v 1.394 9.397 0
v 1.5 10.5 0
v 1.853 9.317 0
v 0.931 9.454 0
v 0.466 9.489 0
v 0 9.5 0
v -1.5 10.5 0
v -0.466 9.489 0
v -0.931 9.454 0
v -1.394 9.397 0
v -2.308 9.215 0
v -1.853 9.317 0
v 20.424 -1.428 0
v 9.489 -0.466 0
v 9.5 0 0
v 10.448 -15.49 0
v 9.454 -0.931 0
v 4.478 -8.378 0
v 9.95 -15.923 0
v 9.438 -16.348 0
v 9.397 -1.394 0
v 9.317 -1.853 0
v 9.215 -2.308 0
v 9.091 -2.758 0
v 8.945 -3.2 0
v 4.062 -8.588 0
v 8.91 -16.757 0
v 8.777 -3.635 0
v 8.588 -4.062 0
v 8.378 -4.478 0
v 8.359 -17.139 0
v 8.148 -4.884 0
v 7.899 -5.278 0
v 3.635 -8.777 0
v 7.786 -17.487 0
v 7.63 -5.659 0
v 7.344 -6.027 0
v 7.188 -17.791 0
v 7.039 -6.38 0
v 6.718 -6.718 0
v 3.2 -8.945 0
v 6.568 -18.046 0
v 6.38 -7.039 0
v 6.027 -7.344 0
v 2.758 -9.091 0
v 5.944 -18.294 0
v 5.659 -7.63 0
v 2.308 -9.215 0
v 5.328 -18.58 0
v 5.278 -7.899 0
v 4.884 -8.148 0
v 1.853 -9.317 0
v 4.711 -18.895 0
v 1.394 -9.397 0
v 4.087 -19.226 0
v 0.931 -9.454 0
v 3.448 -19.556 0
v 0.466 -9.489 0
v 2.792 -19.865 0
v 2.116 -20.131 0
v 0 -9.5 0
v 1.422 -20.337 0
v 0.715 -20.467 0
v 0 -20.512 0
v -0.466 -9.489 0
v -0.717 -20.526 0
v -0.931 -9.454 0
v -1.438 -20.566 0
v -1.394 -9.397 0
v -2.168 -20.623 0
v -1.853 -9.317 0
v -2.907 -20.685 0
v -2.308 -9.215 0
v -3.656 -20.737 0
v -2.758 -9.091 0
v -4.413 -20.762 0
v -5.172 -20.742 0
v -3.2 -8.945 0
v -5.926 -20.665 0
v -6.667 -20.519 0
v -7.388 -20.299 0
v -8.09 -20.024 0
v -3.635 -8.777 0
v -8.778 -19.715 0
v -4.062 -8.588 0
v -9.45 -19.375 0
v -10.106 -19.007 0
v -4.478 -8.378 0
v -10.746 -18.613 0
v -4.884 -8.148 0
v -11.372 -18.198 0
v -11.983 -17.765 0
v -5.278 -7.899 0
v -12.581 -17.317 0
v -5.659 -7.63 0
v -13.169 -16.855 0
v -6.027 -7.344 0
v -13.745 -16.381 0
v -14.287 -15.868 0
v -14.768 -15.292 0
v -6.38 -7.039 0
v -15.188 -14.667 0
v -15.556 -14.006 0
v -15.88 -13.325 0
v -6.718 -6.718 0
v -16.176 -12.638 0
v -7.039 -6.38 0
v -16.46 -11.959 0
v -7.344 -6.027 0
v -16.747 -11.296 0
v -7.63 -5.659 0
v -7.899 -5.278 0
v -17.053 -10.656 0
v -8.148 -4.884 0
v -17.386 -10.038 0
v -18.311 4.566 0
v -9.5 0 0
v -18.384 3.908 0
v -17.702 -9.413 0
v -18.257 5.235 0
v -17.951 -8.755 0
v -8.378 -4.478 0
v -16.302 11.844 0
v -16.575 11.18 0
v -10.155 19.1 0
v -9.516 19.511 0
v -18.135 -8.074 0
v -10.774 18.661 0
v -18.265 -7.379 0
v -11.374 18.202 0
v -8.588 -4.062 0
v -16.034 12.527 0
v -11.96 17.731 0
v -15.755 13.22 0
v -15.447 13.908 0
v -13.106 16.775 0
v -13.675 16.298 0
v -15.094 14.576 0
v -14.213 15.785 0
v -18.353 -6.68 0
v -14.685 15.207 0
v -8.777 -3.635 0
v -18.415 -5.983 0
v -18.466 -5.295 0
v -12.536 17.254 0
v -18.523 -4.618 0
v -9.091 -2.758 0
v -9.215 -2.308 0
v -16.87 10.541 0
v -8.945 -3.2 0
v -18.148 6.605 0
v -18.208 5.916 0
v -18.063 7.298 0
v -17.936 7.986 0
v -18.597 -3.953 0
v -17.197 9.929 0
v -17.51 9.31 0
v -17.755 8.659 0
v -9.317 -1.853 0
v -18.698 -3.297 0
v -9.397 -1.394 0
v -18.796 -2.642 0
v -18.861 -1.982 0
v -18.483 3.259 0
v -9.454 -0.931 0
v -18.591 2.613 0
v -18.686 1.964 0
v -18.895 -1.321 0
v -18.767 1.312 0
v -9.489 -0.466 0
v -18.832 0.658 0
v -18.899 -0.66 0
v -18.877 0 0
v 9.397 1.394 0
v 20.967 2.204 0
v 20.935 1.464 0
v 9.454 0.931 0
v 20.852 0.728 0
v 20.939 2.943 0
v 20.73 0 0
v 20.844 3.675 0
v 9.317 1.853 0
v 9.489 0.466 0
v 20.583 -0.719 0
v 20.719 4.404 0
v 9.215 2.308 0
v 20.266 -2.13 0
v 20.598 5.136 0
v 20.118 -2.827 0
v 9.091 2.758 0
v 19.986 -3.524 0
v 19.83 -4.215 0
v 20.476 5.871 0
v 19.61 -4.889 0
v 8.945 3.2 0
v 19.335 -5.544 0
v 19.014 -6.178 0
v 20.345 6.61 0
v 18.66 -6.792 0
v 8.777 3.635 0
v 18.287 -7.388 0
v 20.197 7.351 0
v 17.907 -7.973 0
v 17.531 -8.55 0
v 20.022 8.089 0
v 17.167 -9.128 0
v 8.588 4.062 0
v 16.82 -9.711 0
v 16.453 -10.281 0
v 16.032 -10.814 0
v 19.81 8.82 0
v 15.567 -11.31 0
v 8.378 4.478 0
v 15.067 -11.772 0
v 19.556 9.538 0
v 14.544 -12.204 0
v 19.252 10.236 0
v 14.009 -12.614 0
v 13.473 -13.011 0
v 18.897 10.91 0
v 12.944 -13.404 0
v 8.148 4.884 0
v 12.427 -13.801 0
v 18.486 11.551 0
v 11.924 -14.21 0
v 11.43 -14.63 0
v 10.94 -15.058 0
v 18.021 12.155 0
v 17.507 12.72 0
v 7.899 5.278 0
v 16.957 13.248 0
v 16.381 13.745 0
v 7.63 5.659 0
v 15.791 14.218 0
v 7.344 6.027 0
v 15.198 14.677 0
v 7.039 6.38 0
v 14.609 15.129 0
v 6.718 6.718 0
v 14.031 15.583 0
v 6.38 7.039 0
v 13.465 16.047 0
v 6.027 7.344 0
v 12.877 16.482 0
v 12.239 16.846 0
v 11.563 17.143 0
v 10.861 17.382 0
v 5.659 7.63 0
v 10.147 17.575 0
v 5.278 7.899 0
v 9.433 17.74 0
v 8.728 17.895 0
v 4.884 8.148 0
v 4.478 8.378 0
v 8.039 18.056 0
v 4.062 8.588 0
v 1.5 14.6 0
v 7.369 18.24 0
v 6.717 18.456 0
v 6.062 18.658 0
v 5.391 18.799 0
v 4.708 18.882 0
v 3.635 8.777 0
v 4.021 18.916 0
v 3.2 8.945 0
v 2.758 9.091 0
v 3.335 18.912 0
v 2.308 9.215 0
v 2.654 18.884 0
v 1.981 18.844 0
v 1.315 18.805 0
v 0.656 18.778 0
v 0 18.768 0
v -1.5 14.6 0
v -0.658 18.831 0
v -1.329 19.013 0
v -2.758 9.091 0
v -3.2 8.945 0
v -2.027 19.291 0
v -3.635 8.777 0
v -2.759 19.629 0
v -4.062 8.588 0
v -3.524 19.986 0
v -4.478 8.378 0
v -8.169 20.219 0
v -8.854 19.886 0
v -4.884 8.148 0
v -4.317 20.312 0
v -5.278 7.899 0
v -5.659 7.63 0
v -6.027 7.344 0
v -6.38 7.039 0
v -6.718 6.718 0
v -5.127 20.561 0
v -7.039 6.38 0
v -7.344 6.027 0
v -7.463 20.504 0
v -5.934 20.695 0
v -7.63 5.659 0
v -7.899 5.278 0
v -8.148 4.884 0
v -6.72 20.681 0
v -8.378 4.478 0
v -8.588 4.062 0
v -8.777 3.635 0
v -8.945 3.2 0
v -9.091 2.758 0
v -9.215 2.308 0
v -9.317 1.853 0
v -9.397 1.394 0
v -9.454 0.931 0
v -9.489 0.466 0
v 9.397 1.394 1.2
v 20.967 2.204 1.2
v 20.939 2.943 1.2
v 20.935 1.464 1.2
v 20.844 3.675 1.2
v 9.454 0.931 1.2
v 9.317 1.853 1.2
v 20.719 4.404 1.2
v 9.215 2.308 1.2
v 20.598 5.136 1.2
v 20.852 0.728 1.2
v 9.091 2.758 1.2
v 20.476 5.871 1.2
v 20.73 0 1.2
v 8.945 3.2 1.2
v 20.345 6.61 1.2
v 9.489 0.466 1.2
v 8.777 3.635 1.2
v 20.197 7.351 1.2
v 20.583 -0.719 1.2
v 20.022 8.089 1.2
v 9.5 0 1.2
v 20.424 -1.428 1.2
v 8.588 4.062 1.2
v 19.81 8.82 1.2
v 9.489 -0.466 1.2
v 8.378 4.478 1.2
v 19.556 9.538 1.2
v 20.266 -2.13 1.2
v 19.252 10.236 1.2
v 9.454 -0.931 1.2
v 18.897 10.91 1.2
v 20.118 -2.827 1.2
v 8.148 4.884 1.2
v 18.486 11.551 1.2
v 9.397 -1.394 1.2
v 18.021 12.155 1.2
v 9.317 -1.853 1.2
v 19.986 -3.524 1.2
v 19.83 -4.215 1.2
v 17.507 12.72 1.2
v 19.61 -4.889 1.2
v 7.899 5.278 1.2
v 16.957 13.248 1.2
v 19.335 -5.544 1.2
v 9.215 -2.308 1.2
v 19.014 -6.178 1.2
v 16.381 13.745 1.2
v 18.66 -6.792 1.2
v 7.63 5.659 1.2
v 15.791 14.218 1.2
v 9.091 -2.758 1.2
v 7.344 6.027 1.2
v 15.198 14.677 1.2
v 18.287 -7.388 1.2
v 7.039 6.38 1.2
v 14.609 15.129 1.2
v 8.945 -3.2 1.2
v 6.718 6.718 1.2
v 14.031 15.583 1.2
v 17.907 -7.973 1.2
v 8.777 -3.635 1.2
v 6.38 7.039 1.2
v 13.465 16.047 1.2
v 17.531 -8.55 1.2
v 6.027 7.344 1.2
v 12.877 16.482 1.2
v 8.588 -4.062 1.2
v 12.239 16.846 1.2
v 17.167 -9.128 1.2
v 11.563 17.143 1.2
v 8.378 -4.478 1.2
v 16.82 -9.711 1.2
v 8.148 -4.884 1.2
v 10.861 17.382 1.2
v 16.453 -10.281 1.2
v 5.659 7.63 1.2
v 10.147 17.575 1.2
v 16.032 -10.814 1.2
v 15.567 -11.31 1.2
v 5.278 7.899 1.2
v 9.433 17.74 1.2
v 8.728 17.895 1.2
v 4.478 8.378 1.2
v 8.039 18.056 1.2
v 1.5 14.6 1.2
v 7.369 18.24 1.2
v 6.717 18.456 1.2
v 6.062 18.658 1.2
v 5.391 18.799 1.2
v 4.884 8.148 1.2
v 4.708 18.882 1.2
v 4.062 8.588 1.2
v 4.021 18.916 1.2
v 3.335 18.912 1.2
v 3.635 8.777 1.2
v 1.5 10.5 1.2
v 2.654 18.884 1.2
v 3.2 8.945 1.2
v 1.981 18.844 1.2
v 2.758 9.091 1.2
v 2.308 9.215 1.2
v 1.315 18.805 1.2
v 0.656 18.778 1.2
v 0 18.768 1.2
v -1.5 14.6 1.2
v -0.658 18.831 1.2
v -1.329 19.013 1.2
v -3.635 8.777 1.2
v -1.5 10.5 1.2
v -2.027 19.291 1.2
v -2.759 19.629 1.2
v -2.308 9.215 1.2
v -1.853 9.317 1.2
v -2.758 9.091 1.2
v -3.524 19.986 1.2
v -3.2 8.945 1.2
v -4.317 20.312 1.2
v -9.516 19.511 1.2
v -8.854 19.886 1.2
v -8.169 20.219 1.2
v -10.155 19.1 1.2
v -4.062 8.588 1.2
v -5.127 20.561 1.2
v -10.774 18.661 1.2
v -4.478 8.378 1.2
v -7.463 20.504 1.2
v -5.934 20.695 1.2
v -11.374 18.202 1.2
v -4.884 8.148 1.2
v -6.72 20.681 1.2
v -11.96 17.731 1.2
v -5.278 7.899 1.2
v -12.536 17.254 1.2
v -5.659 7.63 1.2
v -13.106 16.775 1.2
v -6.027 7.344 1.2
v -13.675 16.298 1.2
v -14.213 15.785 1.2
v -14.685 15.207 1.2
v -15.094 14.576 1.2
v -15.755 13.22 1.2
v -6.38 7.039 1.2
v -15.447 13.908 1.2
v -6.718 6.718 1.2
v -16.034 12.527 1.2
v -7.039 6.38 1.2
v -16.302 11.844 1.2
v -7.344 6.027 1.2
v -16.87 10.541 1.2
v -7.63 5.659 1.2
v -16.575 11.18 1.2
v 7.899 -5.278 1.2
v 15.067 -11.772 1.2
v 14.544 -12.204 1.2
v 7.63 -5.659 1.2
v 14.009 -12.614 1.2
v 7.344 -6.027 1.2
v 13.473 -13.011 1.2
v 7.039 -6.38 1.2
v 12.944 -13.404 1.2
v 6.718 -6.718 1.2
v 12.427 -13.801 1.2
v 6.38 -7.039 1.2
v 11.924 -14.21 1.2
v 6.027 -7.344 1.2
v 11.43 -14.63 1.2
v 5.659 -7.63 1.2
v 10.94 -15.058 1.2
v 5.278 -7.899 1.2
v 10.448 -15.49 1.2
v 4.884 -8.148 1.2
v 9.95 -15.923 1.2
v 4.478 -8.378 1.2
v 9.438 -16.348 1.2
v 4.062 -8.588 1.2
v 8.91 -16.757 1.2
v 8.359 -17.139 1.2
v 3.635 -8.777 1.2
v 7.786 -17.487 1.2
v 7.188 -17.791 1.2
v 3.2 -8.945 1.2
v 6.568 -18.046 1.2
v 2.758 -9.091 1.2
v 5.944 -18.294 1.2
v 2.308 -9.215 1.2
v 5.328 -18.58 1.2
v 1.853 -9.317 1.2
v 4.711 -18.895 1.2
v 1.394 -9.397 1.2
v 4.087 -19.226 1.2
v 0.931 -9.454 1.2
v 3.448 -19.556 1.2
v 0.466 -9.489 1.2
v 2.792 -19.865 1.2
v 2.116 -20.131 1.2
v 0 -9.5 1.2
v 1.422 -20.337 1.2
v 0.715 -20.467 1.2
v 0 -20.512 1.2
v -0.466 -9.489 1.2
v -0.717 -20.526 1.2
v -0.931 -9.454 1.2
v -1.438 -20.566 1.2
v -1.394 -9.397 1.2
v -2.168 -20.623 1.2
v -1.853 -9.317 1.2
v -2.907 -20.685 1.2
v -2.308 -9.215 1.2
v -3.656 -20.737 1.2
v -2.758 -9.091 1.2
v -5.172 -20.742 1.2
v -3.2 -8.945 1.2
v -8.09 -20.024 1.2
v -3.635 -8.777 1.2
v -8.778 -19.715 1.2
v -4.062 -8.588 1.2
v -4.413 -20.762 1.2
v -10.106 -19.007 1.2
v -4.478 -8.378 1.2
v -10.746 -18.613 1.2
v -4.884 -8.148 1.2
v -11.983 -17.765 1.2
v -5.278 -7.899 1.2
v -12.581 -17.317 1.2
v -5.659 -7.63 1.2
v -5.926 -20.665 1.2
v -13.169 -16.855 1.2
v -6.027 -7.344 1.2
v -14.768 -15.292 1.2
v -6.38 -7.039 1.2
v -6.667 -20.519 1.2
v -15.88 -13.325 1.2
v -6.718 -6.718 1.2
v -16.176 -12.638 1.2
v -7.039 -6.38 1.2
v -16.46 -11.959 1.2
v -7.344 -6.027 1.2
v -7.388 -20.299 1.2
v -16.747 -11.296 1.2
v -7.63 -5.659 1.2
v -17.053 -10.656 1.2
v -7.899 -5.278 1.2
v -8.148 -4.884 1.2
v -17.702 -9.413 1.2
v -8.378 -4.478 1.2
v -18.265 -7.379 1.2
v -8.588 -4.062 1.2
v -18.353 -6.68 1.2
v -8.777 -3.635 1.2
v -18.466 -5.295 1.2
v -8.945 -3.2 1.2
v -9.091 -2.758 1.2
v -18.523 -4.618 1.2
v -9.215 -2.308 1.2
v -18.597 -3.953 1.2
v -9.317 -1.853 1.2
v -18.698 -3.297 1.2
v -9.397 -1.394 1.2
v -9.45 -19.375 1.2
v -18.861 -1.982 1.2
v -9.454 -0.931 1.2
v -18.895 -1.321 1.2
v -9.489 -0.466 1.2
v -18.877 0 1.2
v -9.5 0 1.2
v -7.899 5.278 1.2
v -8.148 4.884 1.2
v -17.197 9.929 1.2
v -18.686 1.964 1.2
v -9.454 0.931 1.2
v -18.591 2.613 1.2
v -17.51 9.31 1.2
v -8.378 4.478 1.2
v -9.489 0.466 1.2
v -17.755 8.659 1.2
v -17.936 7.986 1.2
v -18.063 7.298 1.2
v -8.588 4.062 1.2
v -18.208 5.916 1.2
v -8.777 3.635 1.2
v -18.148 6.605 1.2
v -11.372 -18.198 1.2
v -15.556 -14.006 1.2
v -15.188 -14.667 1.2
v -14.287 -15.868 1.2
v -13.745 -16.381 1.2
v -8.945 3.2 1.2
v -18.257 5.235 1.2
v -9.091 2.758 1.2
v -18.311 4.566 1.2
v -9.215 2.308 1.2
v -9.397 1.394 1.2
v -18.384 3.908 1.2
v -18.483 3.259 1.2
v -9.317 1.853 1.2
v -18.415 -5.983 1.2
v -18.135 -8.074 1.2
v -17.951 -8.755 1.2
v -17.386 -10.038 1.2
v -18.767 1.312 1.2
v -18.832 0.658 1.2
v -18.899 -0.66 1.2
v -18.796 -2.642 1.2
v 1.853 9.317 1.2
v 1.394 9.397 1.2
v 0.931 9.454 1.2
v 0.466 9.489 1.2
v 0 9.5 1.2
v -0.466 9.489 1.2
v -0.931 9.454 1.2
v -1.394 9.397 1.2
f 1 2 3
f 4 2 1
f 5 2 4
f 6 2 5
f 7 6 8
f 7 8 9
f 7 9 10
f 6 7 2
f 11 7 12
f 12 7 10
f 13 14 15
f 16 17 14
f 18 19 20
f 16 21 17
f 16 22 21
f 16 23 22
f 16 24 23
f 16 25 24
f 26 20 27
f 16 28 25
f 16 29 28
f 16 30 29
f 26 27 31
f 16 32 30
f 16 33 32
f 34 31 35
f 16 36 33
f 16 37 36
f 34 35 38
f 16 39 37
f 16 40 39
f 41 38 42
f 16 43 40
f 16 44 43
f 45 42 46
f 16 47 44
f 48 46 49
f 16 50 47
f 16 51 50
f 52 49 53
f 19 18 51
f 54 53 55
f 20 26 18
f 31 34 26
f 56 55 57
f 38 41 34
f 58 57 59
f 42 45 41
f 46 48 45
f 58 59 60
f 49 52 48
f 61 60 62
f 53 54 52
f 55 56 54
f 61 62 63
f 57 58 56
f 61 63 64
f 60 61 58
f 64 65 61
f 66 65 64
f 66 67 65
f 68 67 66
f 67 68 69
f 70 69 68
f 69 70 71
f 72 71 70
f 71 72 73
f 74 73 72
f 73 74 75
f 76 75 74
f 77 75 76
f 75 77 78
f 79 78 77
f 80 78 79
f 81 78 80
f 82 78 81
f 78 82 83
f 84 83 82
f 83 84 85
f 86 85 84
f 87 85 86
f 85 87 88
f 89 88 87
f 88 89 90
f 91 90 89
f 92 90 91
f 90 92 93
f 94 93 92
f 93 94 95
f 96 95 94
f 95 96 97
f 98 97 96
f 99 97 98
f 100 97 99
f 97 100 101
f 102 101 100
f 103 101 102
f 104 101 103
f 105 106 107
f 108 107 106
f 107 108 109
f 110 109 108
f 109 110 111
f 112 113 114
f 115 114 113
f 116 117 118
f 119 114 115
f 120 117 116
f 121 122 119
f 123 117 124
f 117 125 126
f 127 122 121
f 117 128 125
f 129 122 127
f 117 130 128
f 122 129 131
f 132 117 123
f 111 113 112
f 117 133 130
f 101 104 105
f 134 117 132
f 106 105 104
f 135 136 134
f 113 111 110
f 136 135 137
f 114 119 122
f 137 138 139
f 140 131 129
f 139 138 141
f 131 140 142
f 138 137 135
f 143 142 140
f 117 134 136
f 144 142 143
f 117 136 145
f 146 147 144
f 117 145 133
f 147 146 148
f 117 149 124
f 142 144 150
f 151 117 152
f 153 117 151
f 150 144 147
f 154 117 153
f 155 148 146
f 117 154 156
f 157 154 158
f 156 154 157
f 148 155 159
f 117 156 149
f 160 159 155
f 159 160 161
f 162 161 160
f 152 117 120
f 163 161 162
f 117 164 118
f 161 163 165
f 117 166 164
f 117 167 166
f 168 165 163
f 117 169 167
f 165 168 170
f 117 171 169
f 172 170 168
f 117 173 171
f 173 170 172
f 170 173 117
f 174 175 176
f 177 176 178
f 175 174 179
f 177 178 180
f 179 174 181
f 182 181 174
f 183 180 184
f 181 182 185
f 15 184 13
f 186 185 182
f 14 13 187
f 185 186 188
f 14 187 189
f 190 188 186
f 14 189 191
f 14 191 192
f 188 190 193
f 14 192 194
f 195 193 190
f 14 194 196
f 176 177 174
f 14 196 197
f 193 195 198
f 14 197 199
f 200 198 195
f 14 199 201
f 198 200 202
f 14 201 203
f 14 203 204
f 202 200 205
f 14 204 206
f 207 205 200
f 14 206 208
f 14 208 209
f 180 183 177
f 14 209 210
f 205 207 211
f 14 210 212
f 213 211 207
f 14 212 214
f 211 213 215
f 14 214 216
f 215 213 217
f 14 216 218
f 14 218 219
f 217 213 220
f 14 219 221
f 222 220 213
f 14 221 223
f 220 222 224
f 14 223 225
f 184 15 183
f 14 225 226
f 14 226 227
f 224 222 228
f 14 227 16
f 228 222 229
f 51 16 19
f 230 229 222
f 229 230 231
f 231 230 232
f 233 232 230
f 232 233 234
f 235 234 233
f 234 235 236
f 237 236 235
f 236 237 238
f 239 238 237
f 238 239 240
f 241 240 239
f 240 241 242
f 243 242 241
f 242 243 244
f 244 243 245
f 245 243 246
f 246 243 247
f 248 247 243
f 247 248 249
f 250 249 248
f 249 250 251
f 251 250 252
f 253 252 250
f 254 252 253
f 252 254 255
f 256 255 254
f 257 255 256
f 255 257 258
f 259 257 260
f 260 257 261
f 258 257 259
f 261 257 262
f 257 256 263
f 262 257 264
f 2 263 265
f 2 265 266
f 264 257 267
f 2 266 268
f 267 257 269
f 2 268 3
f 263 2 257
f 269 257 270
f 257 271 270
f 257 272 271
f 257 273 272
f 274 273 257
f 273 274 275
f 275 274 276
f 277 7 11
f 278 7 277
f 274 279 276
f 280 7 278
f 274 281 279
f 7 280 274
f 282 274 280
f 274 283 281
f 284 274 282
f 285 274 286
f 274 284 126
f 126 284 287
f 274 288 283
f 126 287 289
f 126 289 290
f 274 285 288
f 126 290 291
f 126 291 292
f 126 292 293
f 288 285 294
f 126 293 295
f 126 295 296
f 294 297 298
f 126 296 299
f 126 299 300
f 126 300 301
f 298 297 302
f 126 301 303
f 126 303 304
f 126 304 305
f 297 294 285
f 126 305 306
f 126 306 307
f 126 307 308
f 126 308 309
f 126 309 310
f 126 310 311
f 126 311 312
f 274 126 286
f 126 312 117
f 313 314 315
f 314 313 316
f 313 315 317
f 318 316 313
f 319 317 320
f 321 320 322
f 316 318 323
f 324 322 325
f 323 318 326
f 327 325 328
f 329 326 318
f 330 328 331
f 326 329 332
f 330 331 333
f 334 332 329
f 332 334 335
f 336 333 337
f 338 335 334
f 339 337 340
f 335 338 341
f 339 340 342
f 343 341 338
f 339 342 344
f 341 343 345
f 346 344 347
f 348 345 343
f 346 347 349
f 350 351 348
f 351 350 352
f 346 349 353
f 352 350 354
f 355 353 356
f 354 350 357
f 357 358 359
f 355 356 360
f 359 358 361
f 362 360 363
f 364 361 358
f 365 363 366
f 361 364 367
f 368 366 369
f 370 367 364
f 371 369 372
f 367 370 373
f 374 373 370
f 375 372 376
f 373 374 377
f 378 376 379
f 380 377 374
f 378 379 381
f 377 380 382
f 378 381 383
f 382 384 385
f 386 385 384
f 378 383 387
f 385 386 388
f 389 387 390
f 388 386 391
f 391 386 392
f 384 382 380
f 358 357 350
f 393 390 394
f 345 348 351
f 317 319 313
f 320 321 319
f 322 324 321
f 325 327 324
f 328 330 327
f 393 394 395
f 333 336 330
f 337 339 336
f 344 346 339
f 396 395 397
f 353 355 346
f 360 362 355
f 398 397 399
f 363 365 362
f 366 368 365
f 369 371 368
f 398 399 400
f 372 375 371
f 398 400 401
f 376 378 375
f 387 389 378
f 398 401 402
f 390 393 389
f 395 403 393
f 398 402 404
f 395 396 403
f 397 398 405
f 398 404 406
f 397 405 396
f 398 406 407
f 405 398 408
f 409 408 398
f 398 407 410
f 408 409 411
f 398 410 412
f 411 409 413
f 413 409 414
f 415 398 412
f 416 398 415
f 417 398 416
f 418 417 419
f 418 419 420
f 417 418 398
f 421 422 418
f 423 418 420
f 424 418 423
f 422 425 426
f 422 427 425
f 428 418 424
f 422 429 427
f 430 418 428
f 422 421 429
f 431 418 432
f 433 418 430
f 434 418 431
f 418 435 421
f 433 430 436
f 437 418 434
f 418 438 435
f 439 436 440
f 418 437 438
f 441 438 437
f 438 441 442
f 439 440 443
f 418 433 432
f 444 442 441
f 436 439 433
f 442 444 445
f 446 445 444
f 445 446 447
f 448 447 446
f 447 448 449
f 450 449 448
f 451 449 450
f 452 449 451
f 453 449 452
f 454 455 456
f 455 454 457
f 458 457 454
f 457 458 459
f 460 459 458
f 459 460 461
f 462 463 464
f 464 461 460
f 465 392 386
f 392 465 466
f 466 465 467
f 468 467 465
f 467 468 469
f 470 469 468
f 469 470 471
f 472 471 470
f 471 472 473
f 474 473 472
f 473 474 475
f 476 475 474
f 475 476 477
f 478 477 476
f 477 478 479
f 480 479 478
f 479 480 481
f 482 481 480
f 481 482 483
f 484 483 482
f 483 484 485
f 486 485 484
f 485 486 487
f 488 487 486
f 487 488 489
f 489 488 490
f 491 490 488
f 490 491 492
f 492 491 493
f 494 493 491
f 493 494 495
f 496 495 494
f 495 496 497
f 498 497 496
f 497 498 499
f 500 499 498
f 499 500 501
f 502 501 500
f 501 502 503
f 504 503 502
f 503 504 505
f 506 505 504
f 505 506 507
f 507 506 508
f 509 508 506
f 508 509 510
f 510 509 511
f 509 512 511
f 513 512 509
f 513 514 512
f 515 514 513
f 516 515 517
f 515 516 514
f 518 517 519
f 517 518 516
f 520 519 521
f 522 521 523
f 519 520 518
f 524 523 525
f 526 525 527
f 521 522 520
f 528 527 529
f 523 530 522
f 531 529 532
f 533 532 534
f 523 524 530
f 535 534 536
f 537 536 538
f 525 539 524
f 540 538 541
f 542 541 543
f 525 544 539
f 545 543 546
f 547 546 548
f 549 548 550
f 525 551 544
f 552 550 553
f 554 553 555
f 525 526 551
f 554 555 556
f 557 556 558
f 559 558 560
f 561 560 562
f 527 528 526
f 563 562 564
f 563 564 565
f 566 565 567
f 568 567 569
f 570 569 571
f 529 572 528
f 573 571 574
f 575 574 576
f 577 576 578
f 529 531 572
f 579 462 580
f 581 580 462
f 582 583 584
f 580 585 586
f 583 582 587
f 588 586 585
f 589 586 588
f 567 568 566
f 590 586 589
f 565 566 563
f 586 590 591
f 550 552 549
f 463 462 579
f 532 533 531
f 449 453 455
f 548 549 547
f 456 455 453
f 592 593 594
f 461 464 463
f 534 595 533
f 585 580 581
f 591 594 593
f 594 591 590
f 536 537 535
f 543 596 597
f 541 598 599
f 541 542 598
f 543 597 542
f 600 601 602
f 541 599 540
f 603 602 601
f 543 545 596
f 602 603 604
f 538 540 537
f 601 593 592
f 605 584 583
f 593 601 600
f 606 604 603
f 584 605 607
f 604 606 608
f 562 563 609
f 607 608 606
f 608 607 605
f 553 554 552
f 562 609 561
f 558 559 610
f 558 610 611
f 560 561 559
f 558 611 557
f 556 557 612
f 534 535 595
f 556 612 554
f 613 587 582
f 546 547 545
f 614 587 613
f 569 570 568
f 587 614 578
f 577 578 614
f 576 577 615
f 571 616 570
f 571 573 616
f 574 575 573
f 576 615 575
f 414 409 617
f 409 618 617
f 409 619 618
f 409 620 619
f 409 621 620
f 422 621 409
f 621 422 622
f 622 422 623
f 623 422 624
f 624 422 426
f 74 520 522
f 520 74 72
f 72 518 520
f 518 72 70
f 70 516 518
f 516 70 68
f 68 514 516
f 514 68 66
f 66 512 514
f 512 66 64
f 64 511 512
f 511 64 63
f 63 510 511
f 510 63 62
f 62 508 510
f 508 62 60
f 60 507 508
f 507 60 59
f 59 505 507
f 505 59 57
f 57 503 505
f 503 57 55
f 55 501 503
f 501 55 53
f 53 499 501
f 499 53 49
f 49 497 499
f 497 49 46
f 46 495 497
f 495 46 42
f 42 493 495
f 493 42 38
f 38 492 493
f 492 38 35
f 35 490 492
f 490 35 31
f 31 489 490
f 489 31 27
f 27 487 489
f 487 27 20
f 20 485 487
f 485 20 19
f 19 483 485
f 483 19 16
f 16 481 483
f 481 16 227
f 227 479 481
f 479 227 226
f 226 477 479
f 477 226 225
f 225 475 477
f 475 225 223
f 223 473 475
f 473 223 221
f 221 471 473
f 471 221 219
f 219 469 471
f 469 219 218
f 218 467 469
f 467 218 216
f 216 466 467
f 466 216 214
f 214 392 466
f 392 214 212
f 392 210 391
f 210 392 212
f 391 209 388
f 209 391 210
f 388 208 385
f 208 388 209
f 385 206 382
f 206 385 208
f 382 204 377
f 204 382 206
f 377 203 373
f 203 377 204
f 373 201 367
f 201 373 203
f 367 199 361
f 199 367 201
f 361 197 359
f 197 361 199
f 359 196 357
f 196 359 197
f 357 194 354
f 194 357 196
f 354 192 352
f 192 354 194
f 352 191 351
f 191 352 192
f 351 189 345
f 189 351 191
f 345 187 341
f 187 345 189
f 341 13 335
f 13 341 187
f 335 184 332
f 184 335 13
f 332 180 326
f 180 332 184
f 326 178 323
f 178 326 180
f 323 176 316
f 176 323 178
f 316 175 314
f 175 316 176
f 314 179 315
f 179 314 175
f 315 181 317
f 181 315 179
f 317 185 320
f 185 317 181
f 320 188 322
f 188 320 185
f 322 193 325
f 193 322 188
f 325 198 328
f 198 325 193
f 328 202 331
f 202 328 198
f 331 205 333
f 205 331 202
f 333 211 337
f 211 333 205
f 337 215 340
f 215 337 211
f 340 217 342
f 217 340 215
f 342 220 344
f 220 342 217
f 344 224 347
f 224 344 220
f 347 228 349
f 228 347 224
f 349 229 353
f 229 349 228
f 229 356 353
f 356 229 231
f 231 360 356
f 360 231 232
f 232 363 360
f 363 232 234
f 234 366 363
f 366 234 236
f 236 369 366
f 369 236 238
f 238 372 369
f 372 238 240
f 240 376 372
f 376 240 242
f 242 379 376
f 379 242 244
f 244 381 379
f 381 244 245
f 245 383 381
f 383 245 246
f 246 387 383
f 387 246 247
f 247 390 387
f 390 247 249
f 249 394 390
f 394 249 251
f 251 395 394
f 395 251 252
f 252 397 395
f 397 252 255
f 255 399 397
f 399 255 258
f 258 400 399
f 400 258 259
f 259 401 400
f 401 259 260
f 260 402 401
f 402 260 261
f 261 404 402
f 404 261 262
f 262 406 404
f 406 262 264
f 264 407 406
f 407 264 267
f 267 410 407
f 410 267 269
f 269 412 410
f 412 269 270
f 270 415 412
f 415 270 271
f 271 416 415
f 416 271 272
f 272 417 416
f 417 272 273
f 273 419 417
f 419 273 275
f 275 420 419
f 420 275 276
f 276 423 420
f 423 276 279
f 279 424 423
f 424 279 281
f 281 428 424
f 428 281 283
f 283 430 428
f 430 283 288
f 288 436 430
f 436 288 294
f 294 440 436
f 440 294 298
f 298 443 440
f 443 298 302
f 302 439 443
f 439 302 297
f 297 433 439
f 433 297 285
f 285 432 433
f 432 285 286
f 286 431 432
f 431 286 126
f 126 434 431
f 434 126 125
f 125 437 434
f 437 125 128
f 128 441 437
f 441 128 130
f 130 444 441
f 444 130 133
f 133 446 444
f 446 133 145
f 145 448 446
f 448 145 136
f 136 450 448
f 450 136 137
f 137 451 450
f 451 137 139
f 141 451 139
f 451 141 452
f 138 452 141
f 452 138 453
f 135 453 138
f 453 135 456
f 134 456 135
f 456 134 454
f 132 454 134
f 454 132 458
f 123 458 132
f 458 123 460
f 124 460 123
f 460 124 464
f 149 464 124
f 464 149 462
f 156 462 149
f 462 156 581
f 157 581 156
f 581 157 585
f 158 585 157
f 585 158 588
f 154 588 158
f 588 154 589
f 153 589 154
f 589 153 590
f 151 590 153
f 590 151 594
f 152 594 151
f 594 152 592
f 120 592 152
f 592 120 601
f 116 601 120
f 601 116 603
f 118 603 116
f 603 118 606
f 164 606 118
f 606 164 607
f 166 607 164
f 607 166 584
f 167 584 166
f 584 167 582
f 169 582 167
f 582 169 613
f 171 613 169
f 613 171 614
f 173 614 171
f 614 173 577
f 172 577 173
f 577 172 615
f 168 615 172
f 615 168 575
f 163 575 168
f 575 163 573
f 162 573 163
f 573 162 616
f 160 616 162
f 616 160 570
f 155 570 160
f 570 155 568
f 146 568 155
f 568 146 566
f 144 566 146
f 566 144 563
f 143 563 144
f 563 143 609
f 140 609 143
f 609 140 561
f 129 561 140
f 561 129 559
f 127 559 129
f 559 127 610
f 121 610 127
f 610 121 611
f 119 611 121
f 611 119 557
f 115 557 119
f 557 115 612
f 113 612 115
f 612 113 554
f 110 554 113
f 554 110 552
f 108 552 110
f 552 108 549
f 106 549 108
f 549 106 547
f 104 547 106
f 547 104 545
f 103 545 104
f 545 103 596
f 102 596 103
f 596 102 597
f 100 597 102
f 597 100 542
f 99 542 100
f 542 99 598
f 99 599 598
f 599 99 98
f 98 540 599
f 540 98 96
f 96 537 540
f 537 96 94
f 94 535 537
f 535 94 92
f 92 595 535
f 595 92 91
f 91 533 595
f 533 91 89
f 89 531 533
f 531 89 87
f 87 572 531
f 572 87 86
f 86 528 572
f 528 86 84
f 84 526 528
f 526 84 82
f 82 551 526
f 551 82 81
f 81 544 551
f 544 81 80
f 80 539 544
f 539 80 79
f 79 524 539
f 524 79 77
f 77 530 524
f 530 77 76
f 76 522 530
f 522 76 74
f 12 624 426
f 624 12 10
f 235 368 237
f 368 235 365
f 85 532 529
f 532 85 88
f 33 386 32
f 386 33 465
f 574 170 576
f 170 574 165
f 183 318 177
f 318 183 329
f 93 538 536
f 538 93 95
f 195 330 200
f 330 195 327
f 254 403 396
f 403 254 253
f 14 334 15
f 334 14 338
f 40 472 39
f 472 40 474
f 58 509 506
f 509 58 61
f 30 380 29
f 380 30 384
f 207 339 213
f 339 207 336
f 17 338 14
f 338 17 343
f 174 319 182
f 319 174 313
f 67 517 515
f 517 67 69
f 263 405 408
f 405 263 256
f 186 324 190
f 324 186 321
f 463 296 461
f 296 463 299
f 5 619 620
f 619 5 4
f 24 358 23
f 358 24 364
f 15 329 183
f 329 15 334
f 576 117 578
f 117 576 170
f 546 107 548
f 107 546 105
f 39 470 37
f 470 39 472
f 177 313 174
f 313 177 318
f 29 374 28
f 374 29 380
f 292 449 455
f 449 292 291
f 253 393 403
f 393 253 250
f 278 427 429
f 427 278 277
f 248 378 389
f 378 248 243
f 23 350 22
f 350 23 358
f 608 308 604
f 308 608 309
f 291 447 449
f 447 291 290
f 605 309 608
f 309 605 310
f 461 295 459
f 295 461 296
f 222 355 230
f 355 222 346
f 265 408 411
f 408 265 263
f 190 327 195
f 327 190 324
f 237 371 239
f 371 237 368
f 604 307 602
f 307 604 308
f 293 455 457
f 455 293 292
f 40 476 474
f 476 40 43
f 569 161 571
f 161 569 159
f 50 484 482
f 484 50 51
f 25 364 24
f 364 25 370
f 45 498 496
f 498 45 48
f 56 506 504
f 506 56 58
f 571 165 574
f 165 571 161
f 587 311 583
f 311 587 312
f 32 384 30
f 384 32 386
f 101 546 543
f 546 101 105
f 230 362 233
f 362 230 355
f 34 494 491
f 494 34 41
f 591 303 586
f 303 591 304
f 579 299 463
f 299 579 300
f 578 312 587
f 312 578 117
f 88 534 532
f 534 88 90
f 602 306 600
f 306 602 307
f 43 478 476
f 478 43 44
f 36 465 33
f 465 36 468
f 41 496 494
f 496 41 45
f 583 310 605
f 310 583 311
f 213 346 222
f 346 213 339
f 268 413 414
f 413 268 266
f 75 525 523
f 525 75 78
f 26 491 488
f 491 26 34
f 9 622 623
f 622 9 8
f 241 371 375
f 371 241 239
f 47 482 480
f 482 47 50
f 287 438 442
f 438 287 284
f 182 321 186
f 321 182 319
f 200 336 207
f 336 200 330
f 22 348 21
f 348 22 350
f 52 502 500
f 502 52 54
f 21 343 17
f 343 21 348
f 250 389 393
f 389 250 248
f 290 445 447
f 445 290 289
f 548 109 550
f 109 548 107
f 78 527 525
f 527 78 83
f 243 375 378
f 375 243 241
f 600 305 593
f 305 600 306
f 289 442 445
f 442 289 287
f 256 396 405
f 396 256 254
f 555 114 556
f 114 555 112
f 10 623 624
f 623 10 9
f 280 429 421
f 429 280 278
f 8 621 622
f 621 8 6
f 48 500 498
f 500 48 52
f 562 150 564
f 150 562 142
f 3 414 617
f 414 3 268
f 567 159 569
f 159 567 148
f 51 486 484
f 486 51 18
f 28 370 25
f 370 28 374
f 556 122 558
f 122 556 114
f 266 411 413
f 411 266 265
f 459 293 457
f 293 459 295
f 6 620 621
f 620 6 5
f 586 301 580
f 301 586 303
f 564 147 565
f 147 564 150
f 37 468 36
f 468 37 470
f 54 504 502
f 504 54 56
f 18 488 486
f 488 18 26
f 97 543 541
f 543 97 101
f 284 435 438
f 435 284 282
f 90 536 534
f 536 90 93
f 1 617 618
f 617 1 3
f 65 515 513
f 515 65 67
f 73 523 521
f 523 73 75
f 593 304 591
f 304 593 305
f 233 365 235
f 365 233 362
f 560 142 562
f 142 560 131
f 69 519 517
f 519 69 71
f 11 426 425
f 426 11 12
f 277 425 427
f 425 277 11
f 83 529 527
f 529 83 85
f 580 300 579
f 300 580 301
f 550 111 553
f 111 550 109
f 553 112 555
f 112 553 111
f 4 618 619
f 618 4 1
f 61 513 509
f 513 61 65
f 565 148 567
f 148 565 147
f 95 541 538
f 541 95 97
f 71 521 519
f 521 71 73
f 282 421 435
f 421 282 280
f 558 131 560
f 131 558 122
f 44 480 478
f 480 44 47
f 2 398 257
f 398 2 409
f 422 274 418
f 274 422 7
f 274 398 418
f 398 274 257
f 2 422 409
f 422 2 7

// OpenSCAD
/*
  Elna Supermatic cam 26
  Name: Wave variant
  Status: candidate

  Generated from measured parametric base v2.
  Surface mode: smooth
*/

include <_elna_measured_common.scad>;

profile_points = [
        [0.0000, 18.7680],
        [0.6557, 18.7779],
        [1.3150, 18.8053],
        [1.9806, 18.8439],
        [2.6539, 18.8837],
        [3.3347, 18.9122],
        [4.0207, 18.9161],
        [4.7079, 18.8822],
        [5.3906, 18.7991],
        [6.0625, 18.6585],
        [6.7173, 18.4556],
        [7.3693, 18.2396],
        [8.0391, 18.0561],
        [8.7278, 17.8946],
        [9.4326, 17.7401],
        [10.1470, 17.5751],
        [10.8613, 17.3817],
        [11.5632, 17.1432],
        [12.2395, 16.8462],
        [12.8772, 16.4820],
        [13.4651, 16.0471],
        [14.0312, 15.5833],
        [14.6095, 15.1286],
        [15.1980, 14.6766],
        [15.7913, 14.2185],
        [16.3811, 13.7454],
        [16.9570, 13.2483],
        [17.5073, 12.7198],
        [18.0206, 12.1550],
        [18.4863, 11.5515],
        [18.8967, 10.9100],
        [19.2518, 10.2364],
        [19.5556, 9.5379],
        [19.8104, 8.8202],
        [20.0217, 8.0893],
        [20.1968, 7.3510],
        [20.3450, 6.6105],
        [20.4756, 5.8713],
        [20.5979, 5.1356],
        [20.7191, 4.4040],
        [20.8444, 3.6754],
        [20.9389, 2.9428],
        [20.9672, 2.2037],
        [20.9352, 1.4639],
        [20.8520, 0.7282],
        [20.7300, 0.0000],
        [20.5827, -0.7188],
        [20.4239, -1.4282],
        [20.2656, -2.1300],
        [20.1176, -2.8273],
        [19.9857, -3.5240],
        [19.8297, -4.2149],
        [19.6104, -4.8894],
        [19.3351, -5.5442],
        [19.0142, -6.1781],
        [18.6604, -6.7918],
        [18.2871, -7.3885],
        [17.9071, -7.9727],
        [17.5312, -8.5505],
        [17.1674, -9.1281],
        [16.8199, -9.7110],
        [16.4527, -10.2808],
        [16.0325, -10.8141],
        [15.5673, -11.3103],
        [15.0673, -11.7719],
        [14.5441, -12.2040],
        [14.0092, -12.6140],
        [13.4730, -13.0108],
        [12.9438, -13.4037],
        [12.4267, -13.8012],
        [11.9237, -14.2101],
        [11.4304, -14.6302],
        [10.9401, -15.0578],
        [10.4484, -15.4904],
        [9.9497, -15.9229],
        [9.4385, -16.3480],
        [8.9097, -16.7566],
        [8.3594, -17.1393],
        [7.7856, -17.4867],
        [7.1879, -17.7908],
        [6.5682, -18.0459],
        [5.9443, -18.2945],
        [5.3278, -18.5801],
        [4.7111, -18.8951],
        [4.0867, -19.2264],
        [3.4483, -19.5563],
        [2.7918, -19.8649],
        [2.1159, -20.1315],
        [1.4221, -20.3374],
        [0.7147, -20.4675],
        [0.0000, -20.5120],
        [-0.7168, -20.5262],
        [-1.4381, -20.5659],
        [-2.1676, -20.6231],
        [-2.9071, -20.6853],
        [-3.6565, -20.7371],
        [-4.4130, -20.7616],
        [-5.1716, -20.7423],
        [-5.9256, -20.6651],
        [-6.6671, -20.5194],
        [-7.3883, -20.2992],
        [-8.0903, -20.0241],
        [-8.7779, -19.7154],
        [-9.4500, -19.3754],
        [-10.1062, -19.0069],
        [-10.7465, -18.6135],
        [-11.3717, -18.1985],
        [-11.9829, -17.7654],
        [-12.5814, -17.3169],
        [-13.1686, -16.8550],
        [-13.7454, -16.3811],
        [-14.2873, -15.8676],
        [-14.7678, -15.2925],
        [-15.1884, -14.6673],
        [-15.5556, -14.0063],
        [-15.8801, -13.3250],
        [-16.1762, -12.6382],
        [-16.4599, -11.9588],
        [-16.7473, -11.2962],
        [-17.0526, -10.6556],
        [-17.3863, -10.0380],
        [-17.7025, -9.4126],
        [-17.9506, -8.7551],
        [-18.1351, -8.0743],
        [-18.2650, -7.3795],
        [-18.3531, -6.6800],
        [-18.4149, -5.9834],
        [-18.4665, -5.2952],
        [-18.5230, -4.6183],
        [-18.5972, -3.9530],
        [-18.6976, -3.2969],
        [-18.7959, -2.6416],
        [-18.8613, -1.9824],
        [-18.8949, -1.3213],
        [-18.8992, -0.6600],
        [-18.8770, -0.0000],
        [-18.8318, 0.6576],
        [-18.7671, 1.3123],
        [-18.6859, 1.9640],
        [-18.5906, 2.6127],
        [-18.4829, 3.2590],
        [-18.3840, 3.9076],
        [-18.3115, 4.5656],
        [-18.2569, 5.2351],
        [-18.2076, 5.9160],
        [-18.1483, 6.6054],
        [-18.0629, 7.2979],
        [-17.9360, 7.9856],
        [-17.7547, 8.6595],
        [-17.5100, 9.3102],
        [-17.1975, 9.9290],
        [-16.8699, 10.5415],
        [-16.5752, 11.1801],
        [-16.3017, 11.8439],
        [-16.0341, 12.5272],
        [-15.7549, 13.2199],
        [-15.4466, 13.9082],
        [-15.0939, 14.5760],
        [-14.6849, 15.2066],
        [-14.2126, 15.7846],
        [-13.6753, 16.2976],
        [-13.1064, 16.7754],
        [-12.5357, 17.2539],
        [-11.9596, 17.7309],
        [-11.3738, 18.2019],
        [-10.7738, 18.6607],
        [-10.1555, 19.0997],
        [-9.5160, 19.5107],
        [-8.8538, 19.8860],
        [-8.1689, 20.2188],
        [-7.4629, 20.5041],
        [-6.7197, 20.6810],
        [-5.9341, 20.6946],
        [-5.1266, 20.5615],
        [-4.3174, 20.3118],
        [-3.5240, 19.9857],
        [-2.7588, 19.6295],
        [-2.0275, 19.2908],
        [-1.3295, 19.0130],
        [-0.6576, 18.8312]
];

icon_points = [[-1.000,0.500], [-0.956,0.599], [-0.911,0.691], [-0.867,0.768], [-0.822,0.824], [-0.778,0.855], [-0.733,0.858], [-0.689,0.834], [-0.644,0.784], [-0.600,0.712], [-0.556,0.623], [-0.511,0.525], [-0.467,0.425], [-0.422,0.331], [-0.378,0.250], [-0.333,0.188], [-0.289,0.151], [-0.244,0.140], [-0.200,0.158], [-0.156,0.202], [-0.111,0.269], [-0.067,0.354], [-0.022,0.450], [0.022,0.550], [0.067,0.646], [0.111,0.731], [0.156,0.798], [0.200,0.842], [0.244,0.860], [0.289,0.849], [0.333,0.812], [0.378,0.750], [0.422,0.669], [0.467,0.575], [0.511,0.475], [0.556,0.377], [0.600,0.288], [0.644,0.216], [0.689,0.166], [0.733,0.142], [0.778,0.145], [0.822,0.176], [0.867,0.232], [0.911,0.309], [0.956,0.401], [1.000,0.500]];

elna_cam_ring(profile_points=profile_points);
